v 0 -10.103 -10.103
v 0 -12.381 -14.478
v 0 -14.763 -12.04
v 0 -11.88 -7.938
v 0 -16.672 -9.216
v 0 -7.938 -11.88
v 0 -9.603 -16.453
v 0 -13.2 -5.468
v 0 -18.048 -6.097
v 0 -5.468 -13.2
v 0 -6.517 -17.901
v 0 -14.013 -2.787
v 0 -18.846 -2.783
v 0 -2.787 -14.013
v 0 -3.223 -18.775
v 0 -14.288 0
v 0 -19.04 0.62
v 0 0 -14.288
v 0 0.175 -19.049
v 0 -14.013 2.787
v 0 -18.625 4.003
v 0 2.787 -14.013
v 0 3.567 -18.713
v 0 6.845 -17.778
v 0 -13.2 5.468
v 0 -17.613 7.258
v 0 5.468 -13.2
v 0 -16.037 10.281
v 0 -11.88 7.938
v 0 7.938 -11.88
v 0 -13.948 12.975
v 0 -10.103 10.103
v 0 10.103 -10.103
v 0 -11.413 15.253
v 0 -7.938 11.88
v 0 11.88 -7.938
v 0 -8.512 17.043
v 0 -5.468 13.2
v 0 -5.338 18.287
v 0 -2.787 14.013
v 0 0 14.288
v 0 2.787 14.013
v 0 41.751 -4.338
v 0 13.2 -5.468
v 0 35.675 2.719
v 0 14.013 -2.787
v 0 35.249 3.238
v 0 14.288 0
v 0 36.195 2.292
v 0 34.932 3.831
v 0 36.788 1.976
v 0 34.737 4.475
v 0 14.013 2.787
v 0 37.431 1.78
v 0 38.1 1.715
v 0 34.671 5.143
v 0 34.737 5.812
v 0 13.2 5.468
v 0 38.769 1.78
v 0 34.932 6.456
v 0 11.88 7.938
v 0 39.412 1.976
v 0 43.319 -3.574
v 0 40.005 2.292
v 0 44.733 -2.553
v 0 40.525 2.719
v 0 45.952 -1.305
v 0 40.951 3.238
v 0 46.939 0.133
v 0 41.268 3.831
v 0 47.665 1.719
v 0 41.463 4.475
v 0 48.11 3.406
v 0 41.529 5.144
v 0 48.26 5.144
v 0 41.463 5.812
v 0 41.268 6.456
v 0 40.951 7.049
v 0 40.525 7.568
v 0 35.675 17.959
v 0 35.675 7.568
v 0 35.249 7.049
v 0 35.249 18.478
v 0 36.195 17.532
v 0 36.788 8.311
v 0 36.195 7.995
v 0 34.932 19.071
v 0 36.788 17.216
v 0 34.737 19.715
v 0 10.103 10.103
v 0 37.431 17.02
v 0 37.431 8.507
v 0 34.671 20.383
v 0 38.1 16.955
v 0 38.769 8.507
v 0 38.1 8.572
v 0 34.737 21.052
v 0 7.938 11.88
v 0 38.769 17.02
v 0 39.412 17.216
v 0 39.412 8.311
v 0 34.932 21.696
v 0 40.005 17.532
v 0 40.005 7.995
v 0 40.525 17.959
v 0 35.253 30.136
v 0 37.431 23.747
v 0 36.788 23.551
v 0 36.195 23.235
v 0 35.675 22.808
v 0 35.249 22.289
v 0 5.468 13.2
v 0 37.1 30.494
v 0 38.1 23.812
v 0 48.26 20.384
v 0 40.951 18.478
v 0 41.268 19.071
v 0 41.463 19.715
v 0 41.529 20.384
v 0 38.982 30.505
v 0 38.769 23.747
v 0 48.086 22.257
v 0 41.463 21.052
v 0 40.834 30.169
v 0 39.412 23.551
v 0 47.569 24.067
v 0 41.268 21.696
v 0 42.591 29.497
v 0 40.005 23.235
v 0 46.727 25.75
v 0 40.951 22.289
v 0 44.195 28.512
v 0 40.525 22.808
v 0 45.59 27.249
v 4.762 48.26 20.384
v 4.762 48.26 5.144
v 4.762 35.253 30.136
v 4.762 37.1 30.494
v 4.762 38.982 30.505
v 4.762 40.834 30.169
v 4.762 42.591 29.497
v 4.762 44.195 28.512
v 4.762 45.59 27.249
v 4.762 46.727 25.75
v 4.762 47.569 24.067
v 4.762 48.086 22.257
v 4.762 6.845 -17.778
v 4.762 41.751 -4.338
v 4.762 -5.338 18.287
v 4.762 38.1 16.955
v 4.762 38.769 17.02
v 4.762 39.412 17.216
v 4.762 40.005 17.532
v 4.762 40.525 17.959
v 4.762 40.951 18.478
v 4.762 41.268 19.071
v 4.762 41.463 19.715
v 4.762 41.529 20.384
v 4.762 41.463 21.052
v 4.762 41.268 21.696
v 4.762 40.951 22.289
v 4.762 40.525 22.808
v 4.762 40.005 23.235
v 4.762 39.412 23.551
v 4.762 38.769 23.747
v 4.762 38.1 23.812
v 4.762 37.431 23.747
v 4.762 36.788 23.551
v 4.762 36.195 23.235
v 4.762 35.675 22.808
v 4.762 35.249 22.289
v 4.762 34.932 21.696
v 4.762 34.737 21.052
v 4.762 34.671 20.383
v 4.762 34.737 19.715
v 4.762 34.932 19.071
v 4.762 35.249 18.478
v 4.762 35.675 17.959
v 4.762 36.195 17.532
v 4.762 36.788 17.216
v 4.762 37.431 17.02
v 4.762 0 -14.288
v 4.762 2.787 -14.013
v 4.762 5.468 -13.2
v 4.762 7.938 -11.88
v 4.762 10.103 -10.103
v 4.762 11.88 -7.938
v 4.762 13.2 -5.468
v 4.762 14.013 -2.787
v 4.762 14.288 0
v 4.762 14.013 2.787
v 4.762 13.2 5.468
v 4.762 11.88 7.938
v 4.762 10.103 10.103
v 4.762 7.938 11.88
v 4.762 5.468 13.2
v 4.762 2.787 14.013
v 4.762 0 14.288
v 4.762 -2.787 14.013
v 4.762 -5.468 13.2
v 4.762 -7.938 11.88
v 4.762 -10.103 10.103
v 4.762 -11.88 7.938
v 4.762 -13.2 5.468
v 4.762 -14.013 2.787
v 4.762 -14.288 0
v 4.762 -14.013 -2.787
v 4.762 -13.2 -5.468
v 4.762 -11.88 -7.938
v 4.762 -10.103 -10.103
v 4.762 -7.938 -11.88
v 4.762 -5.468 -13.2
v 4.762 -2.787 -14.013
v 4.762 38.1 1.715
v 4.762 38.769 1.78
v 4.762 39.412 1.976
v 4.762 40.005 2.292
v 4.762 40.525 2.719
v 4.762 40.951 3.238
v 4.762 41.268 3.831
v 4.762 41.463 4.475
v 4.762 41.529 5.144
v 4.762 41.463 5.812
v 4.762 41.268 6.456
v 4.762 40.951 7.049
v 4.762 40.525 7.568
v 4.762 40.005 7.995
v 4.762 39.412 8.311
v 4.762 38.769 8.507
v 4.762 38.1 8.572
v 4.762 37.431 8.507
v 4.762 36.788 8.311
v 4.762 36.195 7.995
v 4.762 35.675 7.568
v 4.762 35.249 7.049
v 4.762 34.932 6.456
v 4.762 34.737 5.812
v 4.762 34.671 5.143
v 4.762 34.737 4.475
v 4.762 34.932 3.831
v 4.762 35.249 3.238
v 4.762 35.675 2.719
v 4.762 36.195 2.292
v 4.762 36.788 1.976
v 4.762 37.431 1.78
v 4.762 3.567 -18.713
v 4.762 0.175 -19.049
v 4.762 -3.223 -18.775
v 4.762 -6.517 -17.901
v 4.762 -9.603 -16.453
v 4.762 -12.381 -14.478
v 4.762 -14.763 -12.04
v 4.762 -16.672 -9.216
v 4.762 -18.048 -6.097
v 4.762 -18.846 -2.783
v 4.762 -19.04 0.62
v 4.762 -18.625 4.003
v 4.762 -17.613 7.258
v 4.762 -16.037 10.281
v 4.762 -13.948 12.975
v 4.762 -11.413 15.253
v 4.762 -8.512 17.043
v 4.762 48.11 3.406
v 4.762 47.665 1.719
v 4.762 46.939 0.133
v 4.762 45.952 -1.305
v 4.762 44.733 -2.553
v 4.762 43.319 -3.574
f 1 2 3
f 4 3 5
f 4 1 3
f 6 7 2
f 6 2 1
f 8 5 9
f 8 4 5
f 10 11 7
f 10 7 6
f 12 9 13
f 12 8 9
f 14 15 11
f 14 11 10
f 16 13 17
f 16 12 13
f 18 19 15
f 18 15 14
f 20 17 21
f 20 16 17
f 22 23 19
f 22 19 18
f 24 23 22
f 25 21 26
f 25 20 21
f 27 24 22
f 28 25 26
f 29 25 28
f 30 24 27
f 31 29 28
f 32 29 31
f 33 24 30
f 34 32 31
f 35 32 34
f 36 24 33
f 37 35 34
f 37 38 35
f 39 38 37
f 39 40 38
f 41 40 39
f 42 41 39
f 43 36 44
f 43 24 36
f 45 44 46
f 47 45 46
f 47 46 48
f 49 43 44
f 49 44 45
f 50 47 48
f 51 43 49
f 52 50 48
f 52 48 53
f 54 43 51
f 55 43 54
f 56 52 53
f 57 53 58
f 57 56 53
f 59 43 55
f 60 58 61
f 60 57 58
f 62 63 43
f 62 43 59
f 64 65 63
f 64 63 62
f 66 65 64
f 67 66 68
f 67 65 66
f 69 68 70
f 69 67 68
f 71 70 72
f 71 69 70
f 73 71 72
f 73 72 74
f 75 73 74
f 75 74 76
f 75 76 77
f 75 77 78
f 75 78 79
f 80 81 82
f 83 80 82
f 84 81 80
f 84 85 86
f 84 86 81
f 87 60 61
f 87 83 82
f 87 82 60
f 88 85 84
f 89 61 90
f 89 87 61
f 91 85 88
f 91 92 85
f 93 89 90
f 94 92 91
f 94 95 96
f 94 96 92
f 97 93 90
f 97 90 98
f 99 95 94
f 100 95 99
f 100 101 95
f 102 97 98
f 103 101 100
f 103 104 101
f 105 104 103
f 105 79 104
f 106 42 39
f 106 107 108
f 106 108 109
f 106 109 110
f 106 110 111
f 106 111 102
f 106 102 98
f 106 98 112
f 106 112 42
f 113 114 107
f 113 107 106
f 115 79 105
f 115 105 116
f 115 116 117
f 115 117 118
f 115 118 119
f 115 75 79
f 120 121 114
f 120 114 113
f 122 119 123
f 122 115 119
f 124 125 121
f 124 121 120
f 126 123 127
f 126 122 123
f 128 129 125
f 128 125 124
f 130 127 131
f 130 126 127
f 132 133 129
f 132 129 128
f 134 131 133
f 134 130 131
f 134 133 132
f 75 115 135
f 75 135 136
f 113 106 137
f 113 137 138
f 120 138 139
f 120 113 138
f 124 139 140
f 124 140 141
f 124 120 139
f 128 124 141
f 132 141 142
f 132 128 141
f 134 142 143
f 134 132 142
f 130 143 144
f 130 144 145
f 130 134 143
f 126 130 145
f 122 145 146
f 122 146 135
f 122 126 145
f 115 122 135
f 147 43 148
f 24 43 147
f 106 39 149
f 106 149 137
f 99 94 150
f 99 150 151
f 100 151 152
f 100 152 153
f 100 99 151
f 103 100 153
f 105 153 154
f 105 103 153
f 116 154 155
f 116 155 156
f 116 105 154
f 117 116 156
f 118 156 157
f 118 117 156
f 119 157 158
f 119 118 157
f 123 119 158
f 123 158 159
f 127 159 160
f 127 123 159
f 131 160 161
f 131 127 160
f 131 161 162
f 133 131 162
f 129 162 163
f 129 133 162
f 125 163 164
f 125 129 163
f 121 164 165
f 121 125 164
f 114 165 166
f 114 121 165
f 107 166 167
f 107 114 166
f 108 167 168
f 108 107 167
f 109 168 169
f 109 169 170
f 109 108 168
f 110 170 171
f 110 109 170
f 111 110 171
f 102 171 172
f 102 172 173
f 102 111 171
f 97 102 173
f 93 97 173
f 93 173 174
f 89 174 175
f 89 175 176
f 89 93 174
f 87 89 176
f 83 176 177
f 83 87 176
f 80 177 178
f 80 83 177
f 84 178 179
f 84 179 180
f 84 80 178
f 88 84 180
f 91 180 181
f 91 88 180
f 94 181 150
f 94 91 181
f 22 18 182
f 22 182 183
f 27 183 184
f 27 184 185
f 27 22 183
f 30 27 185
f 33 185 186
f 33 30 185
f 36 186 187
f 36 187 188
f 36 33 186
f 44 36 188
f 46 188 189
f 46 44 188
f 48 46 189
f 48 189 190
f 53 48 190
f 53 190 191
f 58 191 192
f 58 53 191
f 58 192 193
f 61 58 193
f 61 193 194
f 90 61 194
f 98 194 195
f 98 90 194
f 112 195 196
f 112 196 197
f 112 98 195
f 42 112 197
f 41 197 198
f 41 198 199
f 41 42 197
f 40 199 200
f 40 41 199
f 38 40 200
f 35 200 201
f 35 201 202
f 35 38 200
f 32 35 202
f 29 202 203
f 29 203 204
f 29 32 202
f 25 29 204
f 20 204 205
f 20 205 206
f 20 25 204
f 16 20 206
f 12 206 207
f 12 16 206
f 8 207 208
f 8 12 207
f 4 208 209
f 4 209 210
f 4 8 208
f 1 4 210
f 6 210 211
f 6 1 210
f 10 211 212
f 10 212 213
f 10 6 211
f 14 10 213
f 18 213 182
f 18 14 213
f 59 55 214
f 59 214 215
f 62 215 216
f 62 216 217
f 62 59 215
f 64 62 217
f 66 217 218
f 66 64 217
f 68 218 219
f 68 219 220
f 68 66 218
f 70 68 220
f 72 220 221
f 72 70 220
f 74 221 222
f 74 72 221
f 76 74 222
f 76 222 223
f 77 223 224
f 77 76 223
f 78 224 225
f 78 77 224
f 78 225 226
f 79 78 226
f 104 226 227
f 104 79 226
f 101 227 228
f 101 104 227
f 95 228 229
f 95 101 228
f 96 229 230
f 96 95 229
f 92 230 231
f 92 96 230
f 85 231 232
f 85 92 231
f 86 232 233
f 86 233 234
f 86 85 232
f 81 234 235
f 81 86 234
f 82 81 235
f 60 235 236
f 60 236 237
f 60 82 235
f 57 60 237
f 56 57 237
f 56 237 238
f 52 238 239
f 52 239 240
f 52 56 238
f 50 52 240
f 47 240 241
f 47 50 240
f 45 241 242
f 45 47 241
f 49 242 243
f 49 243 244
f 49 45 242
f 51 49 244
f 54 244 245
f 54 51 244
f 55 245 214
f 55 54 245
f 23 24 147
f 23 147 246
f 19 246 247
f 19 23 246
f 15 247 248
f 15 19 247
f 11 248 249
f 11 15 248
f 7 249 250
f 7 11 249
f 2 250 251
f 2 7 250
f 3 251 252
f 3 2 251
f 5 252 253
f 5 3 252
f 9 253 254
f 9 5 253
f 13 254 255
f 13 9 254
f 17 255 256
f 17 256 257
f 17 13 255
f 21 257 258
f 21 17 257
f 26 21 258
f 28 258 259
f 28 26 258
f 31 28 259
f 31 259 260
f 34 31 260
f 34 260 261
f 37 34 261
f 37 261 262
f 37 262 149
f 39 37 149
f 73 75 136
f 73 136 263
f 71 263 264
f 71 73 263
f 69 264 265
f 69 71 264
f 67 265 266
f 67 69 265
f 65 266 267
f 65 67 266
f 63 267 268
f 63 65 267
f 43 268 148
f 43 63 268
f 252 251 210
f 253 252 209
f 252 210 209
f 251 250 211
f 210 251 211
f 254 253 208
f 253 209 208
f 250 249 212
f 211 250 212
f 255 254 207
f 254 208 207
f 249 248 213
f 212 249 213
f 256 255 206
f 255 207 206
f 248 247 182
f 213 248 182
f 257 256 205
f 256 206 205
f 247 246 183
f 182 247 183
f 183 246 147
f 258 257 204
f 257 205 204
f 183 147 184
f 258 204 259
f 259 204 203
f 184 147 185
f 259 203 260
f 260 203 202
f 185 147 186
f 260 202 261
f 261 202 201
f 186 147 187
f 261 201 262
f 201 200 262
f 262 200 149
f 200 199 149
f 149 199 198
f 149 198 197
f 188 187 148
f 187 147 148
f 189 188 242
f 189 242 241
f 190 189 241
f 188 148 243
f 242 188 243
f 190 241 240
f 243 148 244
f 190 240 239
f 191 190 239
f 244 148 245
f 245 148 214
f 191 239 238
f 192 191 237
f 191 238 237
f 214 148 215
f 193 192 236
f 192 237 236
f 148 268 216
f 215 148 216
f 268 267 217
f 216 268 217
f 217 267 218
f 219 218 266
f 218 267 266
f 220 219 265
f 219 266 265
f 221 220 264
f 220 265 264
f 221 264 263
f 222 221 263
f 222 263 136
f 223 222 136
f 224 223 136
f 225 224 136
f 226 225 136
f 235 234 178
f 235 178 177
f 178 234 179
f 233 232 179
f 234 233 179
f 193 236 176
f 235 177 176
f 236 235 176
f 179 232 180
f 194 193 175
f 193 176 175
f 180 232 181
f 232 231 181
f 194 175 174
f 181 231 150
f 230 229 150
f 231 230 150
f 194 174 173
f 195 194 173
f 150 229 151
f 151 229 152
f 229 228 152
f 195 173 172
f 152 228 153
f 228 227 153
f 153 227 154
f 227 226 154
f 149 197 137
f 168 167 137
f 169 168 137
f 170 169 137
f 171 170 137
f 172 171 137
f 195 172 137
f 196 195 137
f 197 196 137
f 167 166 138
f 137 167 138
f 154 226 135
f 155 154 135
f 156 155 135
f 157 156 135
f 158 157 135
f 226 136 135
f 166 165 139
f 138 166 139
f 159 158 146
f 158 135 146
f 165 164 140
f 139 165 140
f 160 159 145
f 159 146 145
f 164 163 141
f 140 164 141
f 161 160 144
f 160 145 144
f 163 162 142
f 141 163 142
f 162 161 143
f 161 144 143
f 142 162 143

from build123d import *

# Parameters (mm, degrees)
SKETCH1_R           = 14.2875
SKETCH1_R_2         = 3.429
BOSS_EXTRUDE1_DEPTH = 4.7625


with BuildPart() as part:
    # Sketch1 → Boss-Extrude1 (new body)
    with BuildSketch(Plane(origin=(0, 0, 0), x_dir=(0, 0, -1), z_dir=(1, 0, 0))):
        with BuildLine():
            Line((-20.3835, 48.26), (-5.1435, 48.26))
            ThreePointArc((-5.1435, 48.26), (0.606928002, 46.476047862), (4.337968538, 41.750664919))
            Line((4.337968538, 41.750664919), (17.77775351, 6.844996724))
            ThreePointArc((17.77775351, 6.844996724), (6.097008594, -18.047963492), (-18.286717832, -5.33839404))
            Line((-18.286717832, -5.33839404), (-30.136416177, 35.252856512))
            ThreePointArc((-30.136416177, 35.252856512), (-28.512232307, 44.195023468), (-20.3835, 48.26))
        make_face()
        Circle(SKETCH1_R, mode=Mode.SUBTRACT)
        with Locations((-20.3835, 38.1)):
            Circle(SKETCH1_R_2, mode=Mode.SUBTRACT)
        with Locations((-5.1435, 38.1)):
            Circle(SKETCH1_R_2, mode=Mode.SUBTRACT)
    extrude(amount=BOSS_EXTRUDE1_DEPTH)


solid = part.part
